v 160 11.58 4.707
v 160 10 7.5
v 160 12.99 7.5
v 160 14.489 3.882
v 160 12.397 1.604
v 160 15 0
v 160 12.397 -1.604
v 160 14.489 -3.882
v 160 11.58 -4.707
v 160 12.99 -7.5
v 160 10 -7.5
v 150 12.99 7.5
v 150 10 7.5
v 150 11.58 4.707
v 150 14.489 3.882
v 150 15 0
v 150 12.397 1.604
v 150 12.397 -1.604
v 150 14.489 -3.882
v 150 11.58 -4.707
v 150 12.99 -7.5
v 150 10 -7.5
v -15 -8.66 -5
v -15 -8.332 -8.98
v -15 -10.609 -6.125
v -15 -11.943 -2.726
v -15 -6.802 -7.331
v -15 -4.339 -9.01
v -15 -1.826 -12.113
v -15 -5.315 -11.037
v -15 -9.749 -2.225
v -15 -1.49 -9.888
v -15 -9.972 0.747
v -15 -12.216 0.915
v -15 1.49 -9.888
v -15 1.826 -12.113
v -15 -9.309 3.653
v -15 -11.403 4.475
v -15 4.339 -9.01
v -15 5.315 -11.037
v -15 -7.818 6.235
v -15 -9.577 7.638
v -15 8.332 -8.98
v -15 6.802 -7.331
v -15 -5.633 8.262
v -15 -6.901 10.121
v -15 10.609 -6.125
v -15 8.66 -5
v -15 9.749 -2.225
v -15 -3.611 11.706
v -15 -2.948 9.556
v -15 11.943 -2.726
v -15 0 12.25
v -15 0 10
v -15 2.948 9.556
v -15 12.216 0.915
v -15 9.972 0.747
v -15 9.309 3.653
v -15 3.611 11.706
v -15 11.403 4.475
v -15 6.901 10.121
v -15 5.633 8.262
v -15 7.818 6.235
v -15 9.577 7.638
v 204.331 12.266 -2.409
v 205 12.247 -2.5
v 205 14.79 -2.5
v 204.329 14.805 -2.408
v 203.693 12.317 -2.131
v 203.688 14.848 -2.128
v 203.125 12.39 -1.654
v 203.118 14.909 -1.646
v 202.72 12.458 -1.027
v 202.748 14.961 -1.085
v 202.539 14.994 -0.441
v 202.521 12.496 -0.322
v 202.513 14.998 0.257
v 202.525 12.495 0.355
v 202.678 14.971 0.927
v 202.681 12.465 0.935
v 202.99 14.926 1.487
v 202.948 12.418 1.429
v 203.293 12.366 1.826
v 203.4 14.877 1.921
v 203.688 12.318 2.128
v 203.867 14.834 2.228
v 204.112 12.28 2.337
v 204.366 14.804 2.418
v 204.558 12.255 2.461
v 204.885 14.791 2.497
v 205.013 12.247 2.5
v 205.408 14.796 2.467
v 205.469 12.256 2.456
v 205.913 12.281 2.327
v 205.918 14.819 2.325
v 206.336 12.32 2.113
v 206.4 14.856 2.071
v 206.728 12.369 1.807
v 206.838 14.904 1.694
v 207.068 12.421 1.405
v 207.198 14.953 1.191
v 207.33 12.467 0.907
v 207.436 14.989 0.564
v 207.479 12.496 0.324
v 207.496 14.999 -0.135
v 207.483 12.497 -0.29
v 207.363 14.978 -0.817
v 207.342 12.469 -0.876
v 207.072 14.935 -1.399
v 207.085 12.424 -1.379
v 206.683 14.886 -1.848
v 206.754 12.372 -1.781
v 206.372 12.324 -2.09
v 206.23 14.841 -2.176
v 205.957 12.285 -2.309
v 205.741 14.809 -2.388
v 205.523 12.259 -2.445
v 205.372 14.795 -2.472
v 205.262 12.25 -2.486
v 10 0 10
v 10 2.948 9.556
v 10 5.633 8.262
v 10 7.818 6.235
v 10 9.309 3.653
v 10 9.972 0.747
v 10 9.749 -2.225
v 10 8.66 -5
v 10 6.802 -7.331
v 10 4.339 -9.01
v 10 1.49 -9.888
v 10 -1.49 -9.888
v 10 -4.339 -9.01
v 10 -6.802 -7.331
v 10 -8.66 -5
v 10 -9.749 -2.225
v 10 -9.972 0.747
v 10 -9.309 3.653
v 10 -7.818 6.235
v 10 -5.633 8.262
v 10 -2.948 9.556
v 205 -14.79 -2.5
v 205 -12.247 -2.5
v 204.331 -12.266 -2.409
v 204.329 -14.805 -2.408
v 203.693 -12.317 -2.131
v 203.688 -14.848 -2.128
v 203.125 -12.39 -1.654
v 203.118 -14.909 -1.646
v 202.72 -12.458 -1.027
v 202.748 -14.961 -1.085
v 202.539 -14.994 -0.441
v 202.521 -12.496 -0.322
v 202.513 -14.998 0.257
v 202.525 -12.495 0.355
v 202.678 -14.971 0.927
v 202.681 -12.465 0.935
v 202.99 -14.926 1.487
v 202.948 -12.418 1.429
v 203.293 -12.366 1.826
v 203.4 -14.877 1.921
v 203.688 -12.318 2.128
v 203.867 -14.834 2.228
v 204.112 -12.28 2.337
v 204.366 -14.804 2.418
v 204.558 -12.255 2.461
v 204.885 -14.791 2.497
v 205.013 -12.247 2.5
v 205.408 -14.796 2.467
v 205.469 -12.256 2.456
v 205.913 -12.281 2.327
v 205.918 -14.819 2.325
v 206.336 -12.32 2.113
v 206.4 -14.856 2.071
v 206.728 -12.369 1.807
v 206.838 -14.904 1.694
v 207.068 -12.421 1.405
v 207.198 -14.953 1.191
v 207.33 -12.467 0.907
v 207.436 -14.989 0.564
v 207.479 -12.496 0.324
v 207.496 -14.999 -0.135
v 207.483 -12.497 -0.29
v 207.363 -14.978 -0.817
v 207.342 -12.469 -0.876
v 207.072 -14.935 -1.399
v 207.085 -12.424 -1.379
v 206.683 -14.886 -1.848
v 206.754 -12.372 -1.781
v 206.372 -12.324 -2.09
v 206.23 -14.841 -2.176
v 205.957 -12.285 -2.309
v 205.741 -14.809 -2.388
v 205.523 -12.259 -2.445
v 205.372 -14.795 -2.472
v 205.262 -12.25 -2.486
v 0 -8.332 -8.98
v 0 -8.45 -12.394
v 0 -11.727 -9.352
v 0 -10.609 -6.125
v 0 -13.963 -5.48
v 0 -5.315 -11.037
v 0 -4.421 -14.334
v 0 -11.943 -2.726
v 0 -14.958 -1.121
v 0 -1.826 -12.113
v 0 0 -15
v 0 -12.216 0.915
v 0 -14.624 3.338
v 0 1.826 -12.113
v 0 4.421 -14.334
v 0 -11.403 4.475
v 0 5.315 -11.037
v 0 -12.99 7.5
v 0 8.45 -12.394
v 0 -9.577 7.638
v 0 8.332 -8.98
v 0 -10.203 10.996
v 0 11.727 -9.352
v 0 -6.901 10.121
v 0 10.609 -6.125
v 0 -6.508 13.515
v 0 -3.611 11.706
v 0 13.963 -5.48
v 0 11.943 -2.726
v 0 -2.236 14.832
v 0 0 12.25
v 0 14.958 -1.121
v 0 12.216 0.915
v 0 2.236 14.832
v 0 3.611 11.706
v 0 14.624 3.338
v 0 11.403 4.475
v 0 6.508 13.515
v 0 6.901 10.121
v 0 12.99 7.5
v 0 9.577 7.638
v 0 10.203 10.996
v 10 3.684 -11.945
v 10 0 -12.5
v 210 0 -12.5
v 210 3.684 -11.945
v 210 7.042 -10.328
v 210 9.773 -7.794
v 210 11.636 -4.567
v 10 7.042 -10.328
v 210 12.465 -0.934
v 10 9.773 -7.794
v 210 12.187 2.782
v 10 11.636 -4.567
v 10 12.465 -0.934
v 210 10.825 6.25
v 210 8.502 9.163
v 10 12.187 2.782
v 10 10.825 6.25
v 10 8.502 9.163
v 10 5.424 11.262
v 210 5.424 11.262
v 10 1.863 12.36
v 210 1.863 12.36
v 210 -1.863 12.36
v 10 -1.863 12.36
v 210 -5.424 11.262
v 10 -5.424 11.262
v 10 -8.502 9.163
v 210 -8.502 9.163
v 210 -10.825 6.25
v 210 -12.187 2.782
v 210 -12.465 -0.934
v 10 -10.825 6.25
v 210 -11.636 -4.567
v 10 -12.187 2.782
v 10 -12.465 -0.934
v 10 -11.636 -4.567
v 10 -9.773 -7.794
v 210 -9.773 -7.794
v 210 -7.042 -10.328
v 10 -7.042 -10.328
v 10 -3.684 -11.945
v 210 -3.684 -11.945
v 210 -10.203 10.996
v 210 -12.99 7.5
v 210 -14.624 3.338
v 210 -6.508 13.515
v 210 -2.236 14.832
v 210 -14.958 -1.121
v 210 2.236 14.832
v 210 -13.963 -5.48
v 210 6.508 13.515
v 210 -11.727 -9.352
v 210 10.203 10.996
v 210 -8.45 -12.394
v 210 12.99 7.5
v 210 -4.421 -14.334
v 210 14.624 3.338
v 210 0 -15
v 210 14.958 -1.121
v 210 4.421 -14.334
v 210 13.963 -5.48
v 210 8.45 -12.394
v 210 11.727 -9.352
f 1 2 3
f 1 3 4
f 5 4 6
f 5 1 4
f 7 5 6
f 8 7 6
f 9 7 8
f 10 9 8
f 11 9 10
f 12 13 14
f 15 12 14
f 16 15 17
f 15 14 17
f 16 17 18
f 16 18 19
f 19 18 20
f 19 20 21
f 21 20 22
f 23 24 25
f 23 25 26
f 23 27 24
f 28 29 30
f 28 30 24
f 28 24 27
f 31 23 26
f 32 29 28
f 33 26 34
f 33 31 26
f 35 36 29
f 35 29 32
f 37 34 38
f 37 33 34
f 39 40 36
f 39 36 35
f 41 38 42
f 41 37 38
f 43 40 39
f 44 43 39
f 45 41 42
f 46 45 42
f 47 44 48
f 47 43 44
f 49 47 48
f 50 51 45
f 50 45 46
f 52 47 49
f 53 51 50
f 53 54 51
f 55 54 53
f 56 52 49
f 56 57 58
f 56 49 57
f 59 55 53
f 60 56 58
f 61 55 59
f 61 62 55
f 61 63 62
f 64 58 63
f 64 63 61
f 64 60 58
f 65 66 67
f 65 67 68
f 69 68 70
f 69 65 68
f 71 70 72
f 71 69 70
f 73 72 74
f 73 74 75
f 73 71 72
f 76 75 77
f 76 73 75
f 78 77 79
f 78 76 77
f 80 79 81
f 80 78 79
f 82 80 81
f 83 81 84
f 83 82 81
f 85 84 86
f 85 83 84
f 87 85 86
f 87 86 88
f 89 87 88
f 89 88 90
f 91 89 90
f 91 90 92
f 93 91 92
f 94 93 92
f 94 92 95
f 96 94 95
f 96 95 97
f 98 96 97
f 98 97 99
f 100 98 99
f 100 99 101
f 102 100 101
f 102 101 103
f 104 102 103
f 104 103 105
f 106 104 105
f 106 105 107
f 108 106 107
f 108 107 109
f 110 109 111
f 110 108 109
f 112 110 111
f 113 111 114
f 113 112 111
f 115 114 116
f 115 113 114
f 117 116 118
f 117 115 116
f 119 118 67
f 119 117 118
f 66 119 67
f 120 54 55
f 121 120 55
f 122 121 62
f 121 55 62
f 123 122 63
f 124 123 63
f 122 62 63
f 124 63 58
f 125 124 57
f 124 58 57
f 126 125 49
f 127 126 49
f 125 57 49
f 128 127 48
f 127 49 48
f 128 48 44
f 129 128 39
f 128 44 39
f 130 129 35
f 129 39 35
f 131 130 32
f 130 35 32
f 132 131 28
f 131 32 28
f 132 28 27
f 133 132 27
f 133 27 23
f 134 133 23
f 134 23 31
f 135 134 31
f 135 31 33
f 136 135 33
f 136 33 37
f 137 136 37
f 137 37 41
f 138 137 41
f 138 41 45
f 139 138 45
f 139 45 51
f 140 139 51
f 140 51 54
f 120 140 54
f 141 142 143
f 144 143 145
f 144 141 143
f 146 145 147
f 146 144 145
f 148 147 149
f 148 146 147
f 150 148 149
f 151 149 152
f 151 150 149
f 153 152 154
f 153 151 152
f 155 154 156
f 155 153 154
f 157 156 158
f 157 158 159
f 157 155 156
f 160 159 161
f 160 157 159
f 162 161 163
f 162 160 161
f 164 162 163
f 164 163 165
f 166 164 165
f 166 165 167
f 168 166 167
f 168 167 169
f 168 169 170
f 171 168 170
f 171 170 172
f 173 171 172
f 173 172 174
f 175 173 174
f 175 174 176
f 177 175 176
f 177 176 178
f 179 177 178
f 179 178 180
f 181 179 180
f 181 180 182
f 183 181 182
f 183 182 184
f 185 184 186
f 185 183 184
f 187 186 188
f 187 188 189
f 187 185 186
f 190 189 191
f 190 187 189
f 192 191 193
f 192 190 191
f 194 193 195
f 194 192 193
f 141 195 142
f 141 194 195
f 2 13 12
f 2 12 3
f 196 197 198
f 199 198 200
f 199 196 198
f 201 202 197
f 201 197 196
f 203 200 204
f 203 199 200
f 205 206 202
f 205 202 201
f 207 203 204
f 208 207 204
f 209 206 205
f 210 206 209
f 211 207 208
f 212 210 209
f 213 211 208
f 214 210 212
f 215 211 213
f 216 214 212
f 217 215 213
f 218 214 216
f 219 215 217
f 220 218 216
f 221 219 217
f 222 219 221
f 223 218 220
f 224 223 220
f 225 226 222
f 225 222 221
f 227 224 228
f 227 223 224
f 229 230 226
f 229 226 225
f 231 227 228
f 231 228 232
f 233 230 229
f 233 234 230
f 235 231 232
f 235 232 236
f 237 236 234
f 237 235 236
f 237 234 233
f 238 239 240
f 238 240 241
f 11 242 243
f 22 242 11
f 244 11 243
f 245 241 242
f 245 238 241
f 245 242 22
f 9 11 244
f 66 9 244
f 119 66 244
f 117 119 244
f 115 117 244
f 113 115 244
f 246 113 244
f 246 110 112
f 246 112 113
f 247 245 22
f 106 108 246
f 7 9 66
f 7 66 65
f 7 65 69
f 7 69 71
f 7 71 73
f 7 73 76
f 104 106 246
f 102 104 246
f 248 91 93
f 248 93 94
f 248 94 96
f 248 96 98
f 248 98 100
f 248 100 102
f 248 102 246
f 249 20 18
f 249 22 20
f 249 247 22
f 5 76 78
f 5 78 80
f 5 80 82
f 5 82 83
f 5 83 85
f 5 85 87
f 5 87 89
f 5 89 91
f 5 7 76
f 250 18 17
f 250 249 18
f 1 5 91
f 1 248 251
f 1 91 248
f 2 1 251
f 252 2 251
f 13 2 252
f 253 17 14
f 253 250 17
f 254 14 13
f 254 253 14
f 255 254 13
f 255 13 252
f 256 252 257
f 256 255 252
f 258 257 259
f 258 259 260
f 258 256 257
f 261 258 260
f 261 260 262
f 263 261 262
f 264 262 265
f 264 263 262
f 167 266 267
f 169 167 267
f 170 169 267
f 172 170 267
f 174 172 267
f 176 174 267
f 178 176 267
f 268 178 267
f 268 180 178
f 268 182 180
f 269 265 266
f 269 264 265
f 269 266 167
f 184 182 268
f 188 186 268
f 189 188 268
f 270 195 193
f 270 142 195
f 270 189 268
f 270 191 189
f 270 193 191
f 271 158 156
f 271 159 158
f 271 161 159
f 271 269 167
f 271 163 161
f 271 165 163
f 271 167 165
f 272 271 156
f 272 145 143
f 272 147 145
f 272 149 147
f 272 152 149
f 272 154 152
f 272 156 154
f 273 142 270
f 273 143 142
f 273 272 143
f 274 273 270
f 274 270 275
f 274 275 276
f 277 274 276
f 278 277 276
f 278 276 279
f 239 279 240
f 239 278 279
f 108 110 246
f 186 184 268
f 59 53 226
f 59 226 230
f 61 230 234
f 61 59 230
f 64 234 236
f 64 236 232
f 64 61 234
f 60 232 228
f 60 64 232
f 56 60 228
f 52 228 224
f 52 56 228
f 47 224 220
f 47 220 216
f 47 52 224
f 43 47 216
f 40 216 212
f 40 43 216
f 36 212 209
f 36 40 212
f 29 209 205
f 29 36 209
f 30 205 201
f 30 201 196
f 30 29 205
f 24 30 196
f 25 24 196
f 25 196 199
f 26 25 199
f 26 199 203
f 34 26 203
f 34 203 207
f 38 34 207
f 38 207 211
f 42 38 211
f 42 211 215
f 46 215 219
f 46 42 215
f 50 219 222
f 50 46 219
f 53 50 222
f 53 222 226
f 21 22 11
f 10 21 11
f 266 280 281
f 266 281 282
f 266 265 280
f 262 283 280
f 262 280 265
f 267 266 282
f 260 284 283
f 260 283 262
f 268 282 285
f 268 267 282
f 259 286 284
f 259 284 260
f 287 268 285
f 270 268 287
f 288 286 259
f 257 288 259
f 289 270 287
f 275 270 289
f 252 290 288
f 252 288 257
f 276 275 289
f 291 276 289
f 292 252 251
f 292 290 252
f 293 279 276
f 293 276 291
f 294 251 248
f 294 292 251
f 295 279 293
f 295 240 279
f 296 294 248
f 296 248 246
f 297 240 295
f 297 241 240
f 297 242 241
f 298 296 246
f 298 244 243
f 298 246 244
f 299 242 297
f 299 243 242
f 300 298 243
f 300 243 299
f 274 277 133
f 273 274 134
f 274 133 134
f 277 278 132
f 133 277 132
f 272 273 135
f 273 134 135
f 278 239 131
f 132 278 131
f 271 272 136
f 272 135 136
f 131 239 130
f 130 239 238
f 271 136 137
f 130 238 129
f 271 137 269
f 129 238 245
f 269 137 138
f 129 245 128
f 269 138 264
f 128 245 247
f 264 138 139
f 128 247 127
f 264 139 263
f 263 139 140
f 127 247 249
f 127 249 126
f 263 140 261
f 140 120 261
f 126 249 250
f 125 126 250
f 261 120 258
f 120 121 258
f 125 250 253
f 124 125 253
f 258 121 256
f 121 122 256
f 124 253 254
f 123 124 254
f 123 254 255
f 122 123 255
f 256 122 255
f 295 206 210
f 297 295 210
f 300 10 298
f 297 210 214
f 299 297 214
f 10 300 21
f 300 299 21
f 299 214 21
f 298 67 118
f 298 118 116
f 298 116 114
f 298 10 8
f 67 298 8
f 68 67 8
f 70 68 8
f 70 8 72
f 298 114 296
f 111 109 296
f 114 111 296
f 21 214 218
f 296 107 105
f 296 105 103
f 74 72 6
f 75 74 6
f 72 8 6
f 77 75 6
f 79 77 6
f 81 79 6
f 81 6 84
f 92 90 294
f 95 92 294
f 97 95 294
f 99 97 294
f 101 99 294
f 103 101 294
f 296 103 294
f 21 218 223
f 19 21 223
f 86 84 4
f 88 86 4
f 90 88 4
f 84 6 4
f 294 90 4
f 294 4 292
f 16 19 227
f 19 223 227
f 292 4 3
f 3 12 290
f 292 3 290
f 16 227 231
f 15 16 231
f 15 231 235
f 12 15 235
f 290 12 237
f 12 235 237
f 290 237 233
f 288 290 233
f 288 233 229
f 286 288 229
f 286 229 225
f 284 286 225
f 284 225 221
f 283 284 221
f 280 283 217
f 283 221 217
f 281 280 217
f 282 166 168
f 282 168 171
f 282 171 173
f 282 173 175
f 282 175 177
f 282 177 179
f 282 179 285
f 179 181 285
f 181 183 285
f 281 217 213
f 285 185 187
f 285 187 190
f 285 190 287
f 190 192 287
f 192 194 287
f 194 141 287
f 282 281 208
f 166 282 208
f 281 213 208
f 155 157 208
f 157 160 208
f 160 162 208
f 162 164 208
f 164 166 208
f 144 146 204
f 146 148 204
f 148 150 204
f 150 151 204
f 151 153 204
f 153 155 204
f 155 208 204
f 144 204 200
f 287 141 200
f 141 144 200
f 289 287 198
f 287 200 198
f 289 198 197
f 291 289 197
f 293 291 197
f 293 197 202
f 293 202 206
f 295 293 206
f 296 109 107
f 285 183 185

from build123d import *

# Parameters (mm, degrees)
ESBO_O1_R                  = 15
ESBO_O1_R_2                = 12.5
RESSALTO_EXTRUS_O1_DEPTH   = 210
RESSALTO_EXTRUS_O3_START   = 15
ESBO_O2_R                  = 12.25
ESBO_O2_R_2                = 10
RESSALTO_EXTRUS_O3_DEPTH   = 15
CORTE_EXTRUS_O2_DEPTH      = 300
CORTE_EXTRUS_O2_DEPTH_BACK = 300
ESBO_O4_R                  = 2.5
ESBO_O6_W                  = 10
ESBO_O6_H                  = 15
CORTE_EXTRUS_O4_DEPTH      = 20
ESBO_O7_R                  = 12.5
RESSALTO_EXTRUS_O4_DEPTH   = 10
ESBO_O11_R                 = 10
CORTE_EXTRUS_O8_DEPTH      = 20


with BuildPart() as part:
    # Esboço1 → Ressalto-extrusão1 (new body)
    with BuildSketch(Plane(origin=(0, 0, 0), x_dir=(0, 0, -1), z_dir=(1, 0, 0))):
        Circle(ESBO_O1_R)
        Circle(ESBO_O1_R_2, mode=Mode.SUBTRACT)
    extrude(amount=RESSALTO_EXTRUS_O1_DEPTH)

    # Esboço4 → Corte-extrusão2 (cut, two sides: drawn at the far end of the back side and taken through both)
    with BuildSketch(Plane(origin=(0, 0, 0), x_dir=(1, 0, 0), z_dir=(0, 1, 0)).offset(-CORTE_EXTRUS_O2_DEPTH_BACK)):
        with Locations((205, 0)):
            Circle(ESBO_O4_R)
    extrude(amount=CORTE_EXTRUS_O2_DEPTH + CORTE_EXTRUS_O2_DEPTH_BACK, mode=Mode.SUBTRACT)

    # Esboço6 → Corte-extrusão4 (cut)
    with BuildSketch(Plane(origin=(0, 0, 0), x_dir=(1, 0, 0), z_dir=(0, 1, 0))):
        with Locations((155, 0)):
            Rectangle(ESBO_O6_W, ESBO_O6_H)
    extrude(amount=CORTE_EXTRUS_O4_DEPTH, mode=Mode.SUBTRACT)



with BuildPart() as body_2:
    # Esboço2 → Ressalto-extrusão3 (new body)
    with BuildSketch(Plane.ZY.offset(RESSALTO_EXTRUS_O3_START)):
        Circle(ESBO_O2_R)
        Circle(ESBO_O2_R_2, mode=Mode.SUBTRACT)
    extrude(amount=-RESSALTO_EXTRUS_O3_DEPTH)


with BuildPart() as part_1:
    add(part.part)

    add(body_2.part)  # Ressalto-extrusão4 merges body 2
    # Esboço7 → Ressalto-extrusão4 (add)
    with BuildSketch(Plane.ZY):
        Circle(ESBO_O7_R)
    extrude(amount=-RESSALTO_EXTRUS_O4_DEPTH)

    # Esboço11 → Corte-extrusão8 (cut)
    with BuildSketch(Plane.ZY):
        Circle(ESBO_O11_R)
    extrude(amount=-CORTE_EXTRUS_O8_DEPTH, mode=Mode.SUBTRACT)


solid = part_1.part
